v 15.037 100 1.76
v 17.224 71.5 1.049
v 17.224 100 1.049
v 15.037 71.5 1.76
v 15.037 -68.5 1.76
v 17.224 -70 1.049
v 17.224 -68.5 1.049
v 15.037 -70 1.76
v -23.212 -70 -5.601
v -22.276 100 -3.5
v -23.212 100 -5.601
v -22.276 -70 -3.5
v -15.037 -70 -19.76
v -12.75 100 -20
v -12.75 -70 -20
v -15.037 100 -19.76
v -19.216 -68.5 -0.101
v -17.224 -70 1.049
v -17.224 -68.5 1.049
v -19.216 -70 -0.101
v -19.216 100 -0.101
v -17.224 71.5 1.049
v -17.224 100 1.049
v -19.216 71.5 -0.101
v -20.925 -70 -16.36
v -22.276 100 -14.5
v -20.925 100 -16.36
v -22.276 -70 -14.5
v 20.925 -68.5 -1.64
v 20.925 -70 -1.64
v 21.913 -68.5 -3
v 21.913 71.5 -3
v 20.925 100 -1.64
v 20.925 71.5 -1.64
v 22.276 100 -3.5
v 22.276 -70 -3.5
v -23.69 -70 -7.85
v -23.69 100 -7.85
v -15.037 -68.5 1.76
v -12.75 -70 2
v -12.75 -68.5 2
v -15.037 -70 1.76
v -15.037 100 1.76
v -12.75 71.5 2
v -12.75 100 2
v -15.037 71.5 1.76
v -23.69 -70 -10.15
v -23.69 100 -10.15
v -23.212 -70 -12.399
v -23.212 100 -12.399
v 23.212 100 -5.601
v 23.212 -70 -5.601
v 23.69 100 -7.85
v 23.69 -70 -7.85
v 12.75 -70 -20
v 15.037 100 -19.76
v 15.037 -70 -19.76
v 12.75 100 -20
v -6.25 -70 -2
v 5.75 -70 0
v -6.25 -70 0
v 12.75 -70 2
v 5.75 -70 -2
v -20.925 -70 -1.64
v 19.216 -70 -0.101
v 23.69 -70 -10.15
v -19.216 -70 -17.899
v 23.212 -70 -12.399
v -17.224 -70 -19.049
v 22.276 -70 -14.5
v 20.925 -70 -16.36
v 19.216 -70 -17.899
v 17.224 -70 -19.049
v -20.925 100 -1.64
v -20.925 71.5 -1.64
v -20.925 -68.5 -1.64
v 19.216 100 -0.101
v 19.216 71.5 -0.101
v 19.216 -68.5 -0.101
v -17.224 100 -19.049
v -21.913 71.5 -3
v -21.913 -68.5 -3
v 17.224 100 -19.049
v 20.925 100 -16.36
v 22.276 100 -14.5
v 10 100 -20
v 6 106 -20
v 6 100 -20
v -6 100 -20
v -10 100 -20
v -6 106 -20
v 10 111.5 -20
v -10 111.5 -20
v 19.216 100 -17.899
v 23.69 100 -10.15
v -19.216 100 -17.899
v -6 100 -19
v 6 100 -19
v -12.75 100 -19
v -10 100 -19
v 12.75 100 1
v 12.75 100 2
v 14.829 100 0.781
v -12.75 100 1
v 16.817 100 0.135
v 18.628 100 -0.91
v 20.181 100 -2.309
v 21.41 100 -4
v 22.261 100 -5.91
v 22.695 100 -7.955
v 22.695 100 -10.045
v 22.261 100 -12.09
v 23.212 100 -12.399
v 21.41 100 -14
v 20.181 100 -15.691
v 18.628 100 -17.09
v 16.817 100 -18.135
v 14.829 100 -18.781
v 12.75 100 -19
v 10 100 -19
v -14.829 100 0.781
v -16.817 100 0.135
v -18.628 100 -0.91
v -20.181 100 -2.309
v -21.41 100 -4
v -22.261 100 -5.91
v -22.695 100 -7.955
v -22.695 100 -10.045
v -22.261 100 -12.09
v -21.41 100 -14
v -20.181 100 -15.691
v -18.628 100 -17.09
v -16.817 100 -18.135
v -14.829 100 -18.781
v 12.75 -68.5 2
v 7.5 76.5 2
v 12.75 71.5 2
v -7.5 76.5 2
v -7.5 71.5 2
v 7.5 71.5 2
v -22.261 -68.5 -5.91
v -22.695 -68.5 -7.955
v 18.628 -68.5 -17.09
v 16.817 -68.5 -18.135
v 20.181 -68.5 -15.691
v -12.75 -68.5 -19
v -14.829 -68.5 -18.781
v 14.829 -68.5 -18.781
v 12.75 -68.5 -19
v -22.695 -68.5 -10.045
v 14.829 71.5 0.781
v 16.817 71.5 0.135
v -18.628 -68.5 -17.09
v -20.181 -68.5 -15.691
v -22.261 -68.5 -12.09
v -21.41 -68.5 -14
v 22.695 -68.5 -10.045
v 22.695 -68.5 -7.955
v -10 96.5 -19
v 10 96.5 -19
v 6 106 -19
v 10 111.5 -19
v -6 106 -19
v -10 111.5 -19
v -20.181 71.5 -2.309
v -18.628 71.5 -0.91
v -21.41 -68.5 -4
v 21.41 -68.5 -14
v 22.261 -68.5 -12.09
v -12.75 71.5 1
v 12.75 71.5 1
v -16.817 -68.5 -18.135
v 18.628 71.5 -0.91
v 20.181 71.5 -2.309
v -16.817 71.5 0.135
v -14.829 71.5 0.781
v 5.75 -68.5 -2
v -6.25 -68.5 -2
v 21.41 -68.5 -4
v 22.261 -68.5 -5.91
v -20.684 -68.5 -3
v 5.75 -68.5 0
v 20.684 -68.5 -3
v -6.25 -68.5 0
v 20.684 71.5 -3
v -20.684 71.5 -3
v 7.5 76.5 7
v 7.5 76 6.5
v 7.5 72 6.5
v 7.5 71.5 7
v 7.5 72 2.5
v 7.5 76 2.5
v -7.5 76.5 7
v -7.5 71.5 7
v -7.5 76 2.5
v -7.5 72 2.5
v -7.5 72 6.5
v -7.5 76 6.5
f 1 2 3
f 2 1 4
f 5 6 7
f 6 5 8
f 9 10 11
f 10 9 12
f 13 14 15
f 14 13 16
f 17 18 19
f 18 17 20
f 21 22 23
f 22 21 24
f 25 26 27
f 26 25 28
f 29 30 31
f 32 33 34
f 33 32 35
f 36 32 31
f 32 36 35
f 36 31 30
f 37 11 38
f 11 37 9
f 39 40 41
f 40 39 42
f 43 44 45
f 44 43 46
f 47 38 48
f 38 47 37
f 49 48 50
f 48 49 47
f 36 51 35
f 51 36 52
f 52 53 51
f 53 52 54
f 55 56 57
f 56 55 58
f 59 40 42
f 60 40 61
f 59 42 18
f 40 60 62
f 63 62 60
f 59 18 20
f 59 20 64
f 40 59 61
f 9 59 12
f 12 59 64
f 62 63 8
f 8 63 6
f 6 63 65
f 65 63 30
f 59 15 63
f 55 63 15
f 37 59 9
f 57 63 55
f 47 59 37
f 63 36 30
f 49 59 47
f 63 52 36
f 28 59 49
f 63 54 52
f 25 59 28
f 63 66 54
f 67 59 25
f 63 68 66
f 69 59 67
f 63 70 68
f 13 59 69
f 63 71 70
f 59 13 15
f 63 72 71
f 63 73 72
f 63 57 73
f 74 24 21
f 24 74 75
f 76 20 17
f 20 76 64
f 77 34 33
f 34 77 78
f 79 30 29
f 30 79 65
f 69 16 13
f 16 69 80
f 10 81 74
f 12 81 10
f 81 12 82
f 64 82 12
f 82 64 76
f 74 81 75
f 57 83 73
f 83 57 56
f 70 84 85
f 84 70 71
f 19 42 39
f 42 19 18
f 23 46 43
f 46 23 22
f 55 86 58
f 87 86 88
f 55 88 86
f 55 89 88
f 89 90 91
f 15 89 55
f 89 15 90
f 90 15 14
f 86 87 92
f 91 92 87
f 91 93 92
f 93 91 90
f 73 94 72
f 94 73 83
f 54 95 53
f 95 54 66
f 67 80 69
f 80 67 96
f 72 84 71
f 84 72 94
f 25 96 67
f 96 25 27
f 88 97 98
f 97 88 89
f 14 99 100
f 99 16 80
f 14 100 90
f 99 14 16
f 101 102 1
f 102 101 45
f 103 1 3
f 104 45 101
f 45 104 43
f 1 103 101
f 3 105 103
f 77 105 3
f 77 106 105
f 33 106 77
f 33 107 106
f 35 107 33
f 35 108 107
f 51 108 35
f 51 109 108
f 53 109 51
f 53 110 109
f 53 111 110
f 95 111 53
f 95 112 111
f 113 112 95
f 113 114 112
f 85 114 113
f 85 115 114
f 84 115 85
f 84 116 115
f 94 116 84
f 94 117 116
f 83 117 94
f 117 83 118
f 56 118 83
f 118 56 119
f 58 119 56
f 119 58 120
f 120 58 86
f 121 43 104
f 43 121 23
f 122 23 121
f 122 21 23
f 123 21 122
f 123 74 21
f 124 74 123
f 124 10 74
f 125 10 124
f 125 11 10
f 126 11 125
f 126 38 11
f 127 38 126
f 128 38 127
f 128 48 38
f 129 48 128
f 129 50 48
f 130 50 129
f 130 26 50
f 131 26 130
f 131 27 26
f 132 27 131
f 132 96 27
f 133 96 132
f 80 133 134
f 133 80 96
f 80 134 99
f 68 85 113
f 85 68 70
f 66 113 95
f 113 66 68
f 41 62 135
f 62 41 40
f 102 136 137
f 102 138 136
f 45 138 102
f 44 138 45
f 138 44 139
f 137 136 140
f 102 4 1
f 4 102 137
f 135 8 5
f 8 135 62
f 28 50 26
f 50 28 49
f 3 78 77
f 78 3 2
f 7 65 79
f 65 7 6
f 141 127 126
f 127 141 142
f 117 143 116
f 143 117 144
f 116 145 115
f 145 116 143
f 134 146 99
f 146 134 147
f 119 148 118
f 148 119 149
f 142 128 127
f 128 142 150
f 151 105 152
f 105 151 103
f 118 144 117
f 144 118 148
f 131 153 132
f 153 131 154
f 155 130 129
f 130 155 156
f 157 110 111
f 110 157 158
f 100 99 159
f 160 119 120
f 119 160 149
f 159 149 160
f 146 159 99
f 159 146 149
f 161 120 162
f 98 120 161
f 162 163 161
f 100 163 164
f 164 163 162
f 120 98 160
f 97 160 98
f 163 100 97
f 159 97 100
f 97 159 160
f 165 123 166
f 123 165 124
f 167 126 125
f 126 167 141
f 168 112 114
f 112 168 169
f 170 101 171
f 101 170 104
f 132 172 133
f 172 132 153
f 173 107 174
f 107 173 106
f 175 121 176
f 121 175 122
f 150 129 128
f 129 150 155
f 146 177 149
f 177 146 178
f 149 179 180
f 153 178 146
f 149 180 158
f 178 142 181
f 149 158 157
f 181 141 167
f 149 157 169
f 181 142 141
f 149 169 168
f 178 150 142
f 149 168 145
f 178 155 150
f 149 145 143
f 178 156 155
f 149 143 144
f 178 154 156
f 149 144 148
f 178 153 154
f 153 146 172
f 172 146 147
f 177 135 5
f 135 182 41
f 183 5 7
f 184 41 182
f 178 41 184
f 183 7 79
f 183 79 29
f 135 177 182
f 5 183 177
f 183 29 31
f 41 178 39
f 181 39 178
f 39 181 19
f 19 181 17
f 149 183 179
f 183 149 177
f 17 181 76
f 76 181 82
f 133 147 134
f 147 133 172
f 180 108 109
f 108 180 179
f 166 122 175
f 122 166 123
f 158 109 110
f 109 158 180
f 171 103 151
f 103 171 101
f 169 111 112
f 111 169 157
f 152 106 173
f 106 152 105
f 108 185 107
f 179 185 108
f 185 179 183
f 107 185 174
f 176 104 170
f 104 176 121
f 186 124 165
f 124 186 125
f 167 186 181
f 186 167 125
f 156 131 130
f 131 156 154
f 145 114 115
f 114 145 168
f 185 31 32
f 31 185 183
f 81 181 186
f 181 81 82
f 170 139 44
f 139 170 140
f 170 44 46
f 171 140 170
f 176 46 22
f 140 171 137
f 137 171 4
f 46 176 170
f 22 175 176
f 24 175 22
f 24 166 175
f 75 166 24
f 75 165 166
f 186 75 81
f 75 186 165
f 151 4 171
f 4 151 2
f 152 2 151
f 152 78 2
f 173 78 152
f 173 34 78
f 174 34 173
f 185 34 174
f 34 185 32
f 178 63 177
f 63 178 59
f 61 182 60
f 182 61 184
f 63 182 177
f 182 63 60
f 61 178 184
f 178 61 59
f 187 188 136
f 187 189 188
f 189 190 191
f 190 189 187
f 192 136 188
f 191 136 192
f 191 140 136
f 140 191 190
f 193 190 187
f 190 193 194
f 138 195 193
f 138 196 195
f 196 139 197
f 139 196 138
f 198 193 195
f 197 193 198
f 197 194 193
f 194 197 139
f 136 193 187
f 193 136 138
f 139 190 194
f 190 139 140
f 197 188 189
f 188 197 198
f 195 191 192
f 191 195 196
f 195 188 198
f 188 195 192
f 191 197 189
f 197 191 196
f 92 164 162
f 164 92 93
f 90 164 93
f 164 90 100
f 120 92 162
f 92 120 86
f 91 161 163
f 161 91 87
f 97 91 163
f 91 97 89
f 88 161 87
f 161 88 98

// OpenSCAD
// file: connector-blocks.scad
//////////////////////////////////////////////////////////////////////////////////////////////
// This module is used for connecting the snorkel to the filter.//
//////////////////////////////////////////////////////////////////////////////////////////////

// Generates two BLUEoutside blocks for the plug to connect through.
module connector_block_cutout(ccube_x, ccube_y, ccube_z){
    color("blue")
    difference() {
        cube([ccube_x, ccube_y, ccube_z],center=true);
        cube([ccube_x+2, ccube_y-1, ccube_z-1],center=true);
    }
}

// Generates RED inside block for the plug to connect through.
module connector_block_outsides(ccube_x, ccube_y, ccube_z){
    color("red")
    difference() {
        connector_block_cutout(ccube_x, ccube_y, ccube_z);
        cube([ccube_x-15, ccube_y+2, ccube_z+2],center=true);
    }
}

// Generates the white plug to hold the parts together.
module connector_block_peg(ccube_x, ccube_y, ccube_z){
    color("white")
    difference() {
        cube([ccube_x+2, ccube_y, ccube_z],center=true);
        translate([-1, 0, 0])
        connector_block_cutout(ccube_x+.25, ccube_y+.25, ccube_z+.25);
    }
}

// Generates two BLUEoutside blocks for the plug to connect through.
connector_block_outsides(ccube_x=30, ccube_y=5, ccube_z=5);

// Generates RED inside block for the plug to connect through.
connector_block_cutout(ccube_x=15, ccube_y=5, ccube_z=5);

// Generates the white plug to hold the parts together.
//connector_block_peg(ccube_x=30, ccube_y=5, ccube_z=5);
// main file
//////////////////////////////////////////////////////////////////////////////////////////////
// This module is used for maintaining the connector tube to the PM2.5 Filter holder bottom.//
//////////////////////////////////////////////////////////////////////////////////////////////

// This imports the connector blocks, designed to connect the snorkel to the filter bottom.
use <connector-blocks.scad>


// This module is for generating the outer tube wall.
module snorkel_tube_outer_wall(snorkel_diameter, snorkel_tube_height, snorkel_tube_radius){
    hull() {
        translate([0, snorkel_diameter, 0]) 
        cylinder(h = snorkel_tube_height, r1 = snorkel_tube_radius, r2 = snorkel_tube_radius, center = true);
        cylinder(h = snorkel_tube_height, r1 = snorkel_tube_radius, r2 = snorkel_tube_radius, center = true);
        }
}

// This module is for removing the center of the tube.
module snorkel_tube_inner_cutout(snorkel_diameter, snorkel_tube_height, snorkel_tube_radius){
    translate([0, 0, -1])
    hull() {
        translate([0, snorkel_diameter, 0]) 
        cylinder(h = snorkel_tube_height-1, r1 = snorkel_tube_radius-1, r2 = snorkel_tube_radius-1, center = true);
        cylinder(h = snorkel_tube_height-1, r1 = snorkel_tube_radius-1, r2 = snorkel_tube_radius-1, center = true);
    }
}


// This module combines the first two modules to diff the inner out of the outer wall.
module diffed_snorkel_tube(snorkel_diameter, snorkel_tube_height, snorkel_tube_radius){
    
    translate([0, -(snorkel_diameter/2), 0])
    difference(){
    snorkel_tube_outer_wall(snorkel_diameter, snorkel_tube_height, snorkel_tube_radius);
    snorkel_tube_inner_cutout(snorkel_diameter, snorkel_tube_height, snorkel_tube_radius);
    
    color("red")
    translate([-11, 0, 13.5])
    cube([10,90,140],center=true);

    // Snorkel tube backside cutout.
    color("purple")
    translate([-8, 12.5, 84])
    cube([2,12,6], center=true);   

    }
   
}

// This module is for generating connector clip to connect the tube to the mask.
module connector_clip(){
    difference(){
        cube([15,20,1],center=true);
        translate([-1,0,0])
        cube([6,12,10],center=true);      
    }
}

module snorkel_filter_attachment_tube(snorkel_diameter, snorkel_tube_height, snorkel_tube_radius){
    rotate([90,90,0])
    translate([9, 0, -15])   
    diffed_snorkel_tube(snorkel_diameter, snorkel_tube_height, snorkel_tube_radius);   
    
    // This adds the black connector section on the front to connect the filter bottom to the snorkel tube.
    //use <connector-blocks.scad>
    color("black")
    translate([0,74,4.5])
    connector_block_cutout(ccube_x=15, ccube_y=5, ccube_z=5);
    
    color("green")
    rotate([0,0,90])
    translate([104,0, -19.5])
    connector_clip();
  
}

snorkel_filter_attachment_tube(snorkel_diameter=25.5, snorkel_tube_height=170, snorkel_tube_radius=11);
